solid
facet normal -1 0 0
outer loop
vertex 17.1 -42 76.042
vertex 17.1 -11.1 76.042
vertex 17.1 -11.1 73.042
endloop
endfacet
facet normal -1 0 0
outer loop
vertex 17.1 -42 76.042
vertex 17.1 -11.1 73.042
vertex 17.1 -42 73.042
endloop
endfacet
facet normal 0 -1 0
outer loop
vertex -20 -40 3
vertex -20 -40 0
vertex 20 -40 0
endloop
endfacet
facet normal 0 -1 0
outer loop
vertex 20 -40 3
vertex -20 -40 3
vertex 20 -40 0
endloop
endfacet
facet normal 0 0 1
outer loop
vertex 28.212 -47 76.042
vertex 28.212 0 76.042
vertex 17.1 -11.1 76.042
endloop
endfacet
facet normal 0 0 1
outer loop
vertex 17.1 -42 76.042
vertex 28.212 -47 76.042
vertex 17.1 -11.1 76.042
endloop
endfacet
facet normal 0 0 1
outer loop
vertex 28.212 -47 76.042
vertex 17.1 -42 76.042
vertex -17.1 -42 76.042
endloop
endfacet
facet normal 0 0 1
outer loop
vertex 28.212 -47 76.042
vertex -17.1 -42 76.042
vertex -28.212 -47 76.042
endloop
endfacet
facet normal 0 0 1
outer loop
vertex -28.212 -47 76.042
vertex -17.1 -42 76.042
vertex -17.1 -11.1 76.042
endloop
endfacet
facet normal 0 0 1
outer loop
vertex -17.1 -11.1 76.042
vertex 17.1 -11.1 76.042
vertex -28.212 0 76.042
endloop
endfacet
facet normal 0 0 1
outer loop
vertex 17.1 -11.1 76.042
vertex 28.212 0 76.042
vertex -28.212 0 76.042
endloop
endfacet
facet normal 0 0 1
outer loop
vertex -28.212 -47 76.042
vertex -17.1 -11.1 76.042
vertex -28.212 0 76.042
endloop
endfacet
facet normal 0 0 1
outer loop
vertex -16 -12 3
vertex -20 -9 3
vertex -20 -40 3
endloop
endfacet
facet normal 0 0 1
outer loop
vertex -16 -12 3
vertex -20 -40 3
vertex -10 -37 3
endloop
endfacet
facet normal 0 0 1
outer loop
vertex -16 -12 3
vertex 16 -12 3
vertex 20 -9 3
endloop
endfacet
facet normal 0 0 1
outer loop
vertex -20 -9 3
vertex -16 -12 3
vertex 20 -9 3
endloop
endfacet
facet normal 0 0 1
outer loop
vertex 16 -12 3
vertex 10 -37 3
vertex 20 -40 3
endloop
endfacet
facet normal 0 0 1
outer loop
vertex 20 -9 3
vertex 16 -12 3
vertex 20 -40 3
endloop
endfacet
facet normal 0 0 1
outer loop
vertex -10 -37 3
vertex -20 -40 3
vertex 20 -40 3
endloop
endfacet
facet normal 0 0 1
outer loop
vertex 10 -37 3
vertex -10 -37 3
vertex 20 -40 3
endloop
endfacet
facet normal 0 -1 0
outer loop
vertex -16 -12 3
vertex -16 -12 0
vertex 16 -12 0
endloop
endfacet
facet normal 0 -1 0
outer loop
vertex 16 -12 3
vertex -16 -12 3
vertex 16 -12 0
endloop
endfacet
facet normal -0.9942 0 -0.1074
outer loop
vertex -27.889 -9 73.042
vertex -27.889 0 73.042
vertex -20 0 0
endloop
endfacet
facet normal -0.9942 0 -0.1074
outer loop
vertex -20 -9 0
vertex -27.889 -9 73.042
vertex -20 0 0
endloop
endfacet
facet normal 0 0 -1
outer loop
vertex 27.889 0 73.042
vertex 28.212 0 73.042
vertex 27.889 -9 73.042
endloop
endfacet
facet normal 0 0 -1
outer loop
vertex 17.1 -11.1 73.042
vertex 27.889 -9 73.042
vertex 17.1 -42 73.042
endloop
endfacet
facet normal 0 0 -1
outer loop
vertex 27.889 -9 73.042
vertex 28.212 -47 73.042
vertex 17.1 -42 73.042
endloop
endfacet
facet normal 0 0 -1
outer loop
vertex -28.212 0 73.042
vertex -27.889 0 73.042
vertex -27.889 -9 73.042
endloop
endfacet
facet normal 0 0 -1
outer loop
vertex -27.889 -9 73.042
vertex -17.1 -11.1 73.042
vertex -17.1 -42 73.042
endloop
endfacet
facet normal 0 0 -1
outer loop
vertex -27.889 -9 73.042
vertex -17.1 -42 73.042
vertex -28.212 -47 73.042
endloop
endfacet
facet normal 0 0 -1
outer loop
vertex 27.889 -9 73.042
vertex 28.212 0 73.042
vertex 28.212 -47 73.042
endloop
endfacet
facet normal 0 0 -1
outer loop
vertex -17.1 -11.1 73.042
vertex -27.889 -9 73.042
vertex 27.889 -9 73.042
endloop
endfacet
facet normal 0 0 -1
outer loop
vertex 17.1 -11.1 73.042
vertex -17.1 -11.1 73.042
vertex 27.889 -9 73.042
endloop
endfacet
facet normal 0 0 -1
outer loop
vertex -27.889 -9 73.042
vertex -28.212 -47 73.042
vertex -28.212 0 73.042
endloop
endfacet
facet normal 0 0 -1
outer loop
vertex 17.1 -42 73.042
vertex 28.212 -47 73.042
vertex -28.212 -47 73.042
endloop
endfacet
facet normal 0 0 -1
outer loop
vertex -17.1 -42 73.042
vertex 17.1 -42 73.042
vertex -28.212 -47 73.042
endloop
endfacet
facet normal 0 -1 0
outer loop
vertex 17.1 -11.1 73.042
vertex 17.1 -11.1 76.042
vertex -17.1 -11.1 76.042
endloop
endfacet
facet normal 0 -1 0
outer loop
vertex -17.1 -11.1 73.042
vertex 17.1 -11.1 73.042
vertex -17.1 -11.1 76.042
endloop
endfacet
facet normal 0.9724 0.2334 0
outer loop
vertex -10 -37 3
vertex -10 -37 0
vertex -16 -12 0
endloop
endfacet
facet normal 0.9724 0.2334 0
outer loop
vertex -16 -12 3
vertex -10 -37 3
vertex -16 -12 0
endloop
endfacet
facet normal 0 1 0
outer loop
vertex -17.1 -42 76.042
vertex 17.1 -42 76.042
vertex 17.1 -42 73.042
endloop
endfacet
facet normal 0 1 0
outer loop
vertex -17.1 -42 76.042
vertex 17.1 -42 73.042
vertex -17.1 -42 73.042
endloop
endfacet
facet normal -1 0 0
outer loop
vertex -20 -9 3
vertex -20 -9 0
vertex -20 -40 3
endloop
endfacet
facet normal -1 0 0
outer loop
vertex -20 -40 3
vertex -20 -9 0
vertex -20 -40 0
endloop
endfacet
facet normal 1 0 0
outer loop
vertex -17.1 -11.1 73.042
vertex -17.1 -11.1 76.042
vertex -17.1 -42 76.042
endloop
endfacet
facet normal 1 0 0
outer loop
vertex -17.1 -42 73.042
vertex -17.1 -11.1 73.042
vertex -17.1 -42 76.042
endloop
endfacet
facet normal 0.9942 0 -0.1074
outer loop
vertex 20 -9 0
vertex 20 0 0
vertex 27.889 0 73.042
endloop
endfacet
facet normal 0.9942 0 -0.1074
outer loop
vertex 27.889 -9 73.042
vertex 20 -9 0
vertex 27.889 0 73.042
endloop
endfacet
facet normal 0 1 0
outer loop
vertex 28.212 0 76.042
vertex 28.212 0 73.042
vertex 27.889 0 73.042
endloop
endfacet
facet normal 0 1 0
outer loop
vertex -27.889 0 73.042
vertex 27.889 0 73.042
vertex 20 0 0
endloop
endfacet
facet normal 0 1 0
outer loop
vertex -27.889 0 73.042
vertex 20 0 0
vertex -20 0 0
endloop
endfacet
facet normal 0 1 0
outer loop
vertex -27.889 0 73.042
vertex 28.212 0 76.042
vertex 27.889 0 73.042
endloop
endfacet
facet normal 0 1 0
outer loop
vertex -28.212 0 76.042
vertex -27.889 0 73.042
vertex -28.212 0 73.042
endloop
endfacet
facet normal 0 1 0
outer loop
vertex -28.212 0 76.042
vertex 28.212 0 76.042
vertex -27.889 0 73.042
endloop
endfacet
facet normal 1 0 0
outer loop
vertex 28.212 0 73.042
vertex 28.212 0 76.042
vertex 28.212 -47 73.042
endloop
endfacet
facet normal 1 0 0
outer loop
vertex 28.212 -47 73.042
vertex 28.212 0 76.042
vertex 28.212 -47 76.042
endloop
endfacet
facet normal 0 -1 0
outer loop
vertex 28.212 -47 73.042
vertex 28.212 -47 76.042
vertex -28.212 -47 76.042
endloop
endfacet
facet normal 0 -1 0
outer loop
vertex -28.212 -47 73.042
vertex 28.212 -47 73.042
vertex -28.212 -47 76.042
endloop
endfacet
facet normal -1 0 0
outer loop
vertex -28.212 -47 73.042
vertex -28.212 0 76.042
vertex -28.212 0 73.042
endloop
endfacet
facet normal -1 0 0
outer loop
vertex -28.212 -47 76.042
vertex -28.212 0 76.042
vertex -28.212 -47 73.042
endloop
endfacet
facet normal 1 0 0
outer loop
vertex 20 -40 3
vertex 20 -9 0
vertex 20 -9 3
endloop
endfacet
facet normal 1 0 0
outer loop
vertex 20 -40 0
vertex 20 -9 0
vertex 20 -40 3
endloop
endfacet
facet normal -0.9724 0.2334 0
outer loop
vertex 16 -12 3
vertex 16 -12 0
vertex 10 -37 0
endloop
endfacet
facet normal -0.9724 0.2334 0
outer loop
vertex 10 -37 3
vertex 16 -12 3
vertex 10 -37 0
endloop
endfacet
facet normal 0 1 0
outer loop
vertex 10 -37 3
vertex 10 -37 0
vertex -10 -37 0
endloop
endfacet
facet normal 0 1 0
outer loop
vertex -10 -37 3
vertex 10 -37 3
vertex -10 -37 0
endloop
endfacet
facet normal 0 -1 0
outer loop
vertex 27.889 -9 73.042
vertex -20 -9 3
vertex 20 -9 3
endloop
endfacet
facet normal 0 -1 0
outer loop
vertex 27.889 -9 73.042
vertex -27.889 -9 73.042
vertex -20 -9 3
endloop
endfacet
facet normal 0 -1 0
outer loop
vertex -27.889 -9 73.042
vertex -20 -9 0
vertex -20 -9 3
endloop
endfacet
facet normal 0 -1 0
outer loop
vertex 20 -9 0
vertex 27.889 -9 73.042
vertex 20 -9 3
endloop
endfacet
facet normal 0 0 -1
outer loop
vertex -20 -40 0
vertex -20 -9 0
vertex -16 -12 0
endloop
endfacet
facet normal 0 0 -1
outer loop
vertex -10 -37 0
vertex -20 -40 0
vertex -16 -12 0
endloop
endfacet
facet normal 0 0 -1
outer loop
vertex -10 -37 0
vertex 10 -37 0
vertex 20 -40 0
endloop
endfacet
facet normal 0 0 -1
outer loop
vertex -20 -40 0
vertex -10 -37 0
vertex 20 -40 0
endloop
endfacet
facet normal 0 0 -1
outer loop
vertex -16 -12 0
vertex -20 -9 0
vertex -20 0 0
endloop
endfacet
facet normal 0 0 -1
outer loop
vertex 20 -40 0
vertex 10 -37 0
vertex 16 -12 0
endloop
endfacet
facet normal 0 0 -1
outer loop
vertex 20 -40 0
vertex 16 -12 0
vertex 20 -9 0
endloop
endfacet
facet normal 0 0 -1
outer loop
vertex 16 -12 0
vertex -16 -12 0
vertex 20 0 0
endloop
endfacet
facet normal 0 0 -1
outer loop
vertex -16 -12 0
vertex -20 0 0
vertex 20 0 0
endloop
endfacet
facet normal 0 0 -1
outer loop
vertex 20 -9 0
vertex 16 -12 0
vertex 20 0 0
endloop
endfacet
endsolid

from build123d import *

# Parameters (mm, degrees)
PAD_DEPTH       = 9
SKETCH001_W     = 40
SKETCH001_H     = 40
PAD001_DEPTH    = 3
SKETCH002_W     = 56.425
SKETCH002_H     = 47
PAD002_DEPTH    = 3
SKETCH003_W     = 34.2
SKETCH003_H     = 30.9
POCKET_DEPTH    = 5
POCKET001_DEPTH = 5


with BuildPart() as part:
    # Sketch → Pad (new body)
    with BuildSketch(Plane.XZ):
        Polygon((-20, 0), (20, 0), (28.2125, 76.042319), (-28.2125, 76.042319), align=None)
    extrude(amount=PAD_DEPTH)

    # Sketch001 (on Face2 of Pad) → Pad001 (join)
    with BuildSketch(Plane(origin=(0, 0, 0), x_dir=(1, 0, 0), z_dir=(0, 0, -1))):
        with Locations((0, 20)):
            Rectangle(SKETCH001_W, SKETCH001_H)
    extrude(amount=-PAD001_DEPTH)

    # Sketch002 (on Face2 of Pad001) → Pad002 (join)
    with BuildSketch(Plane(origin=(0, 0, 76.042319), x_dir=(-1, 0, 0), z_dir=(0, 0, 1))):
        with Locations((0, 23.5)):
            Rectangle(SKETCH002_W, SKETCH002_H)
    extrude(amount=-PAD002_DEPTH)

    # Sketch003 (on Face14 of Pad002) → Pocket (cut)
    with BuildSketch(Plane(origin=(0, 0, 76.042319), x_dir=(-1, 0, 0), z_dir=(0, 0, 1))):
        with Locations((0, 26.55)):
            Rectangle(SKETCH003_W, SKETCH003_H)
    extrude(amount=-POCKET_DEPTH, mode=Mode.SUBTRACT)

    # Sketch004 (on Face5 of Pocket) → Pocket001 (cut)
    with BuildSketch(Plane(origin=(0, 0, 0), x_dir=(1, 0, 0), z_dir=(0, 0, -1))):
        Polygon((-16, 12), (16, 12), (10, 37), (-10, 37), align=None)
    extrude(amount=-POCKET001_DEPTH, mode=Mode.SUBTRACT)


solid = part.part
